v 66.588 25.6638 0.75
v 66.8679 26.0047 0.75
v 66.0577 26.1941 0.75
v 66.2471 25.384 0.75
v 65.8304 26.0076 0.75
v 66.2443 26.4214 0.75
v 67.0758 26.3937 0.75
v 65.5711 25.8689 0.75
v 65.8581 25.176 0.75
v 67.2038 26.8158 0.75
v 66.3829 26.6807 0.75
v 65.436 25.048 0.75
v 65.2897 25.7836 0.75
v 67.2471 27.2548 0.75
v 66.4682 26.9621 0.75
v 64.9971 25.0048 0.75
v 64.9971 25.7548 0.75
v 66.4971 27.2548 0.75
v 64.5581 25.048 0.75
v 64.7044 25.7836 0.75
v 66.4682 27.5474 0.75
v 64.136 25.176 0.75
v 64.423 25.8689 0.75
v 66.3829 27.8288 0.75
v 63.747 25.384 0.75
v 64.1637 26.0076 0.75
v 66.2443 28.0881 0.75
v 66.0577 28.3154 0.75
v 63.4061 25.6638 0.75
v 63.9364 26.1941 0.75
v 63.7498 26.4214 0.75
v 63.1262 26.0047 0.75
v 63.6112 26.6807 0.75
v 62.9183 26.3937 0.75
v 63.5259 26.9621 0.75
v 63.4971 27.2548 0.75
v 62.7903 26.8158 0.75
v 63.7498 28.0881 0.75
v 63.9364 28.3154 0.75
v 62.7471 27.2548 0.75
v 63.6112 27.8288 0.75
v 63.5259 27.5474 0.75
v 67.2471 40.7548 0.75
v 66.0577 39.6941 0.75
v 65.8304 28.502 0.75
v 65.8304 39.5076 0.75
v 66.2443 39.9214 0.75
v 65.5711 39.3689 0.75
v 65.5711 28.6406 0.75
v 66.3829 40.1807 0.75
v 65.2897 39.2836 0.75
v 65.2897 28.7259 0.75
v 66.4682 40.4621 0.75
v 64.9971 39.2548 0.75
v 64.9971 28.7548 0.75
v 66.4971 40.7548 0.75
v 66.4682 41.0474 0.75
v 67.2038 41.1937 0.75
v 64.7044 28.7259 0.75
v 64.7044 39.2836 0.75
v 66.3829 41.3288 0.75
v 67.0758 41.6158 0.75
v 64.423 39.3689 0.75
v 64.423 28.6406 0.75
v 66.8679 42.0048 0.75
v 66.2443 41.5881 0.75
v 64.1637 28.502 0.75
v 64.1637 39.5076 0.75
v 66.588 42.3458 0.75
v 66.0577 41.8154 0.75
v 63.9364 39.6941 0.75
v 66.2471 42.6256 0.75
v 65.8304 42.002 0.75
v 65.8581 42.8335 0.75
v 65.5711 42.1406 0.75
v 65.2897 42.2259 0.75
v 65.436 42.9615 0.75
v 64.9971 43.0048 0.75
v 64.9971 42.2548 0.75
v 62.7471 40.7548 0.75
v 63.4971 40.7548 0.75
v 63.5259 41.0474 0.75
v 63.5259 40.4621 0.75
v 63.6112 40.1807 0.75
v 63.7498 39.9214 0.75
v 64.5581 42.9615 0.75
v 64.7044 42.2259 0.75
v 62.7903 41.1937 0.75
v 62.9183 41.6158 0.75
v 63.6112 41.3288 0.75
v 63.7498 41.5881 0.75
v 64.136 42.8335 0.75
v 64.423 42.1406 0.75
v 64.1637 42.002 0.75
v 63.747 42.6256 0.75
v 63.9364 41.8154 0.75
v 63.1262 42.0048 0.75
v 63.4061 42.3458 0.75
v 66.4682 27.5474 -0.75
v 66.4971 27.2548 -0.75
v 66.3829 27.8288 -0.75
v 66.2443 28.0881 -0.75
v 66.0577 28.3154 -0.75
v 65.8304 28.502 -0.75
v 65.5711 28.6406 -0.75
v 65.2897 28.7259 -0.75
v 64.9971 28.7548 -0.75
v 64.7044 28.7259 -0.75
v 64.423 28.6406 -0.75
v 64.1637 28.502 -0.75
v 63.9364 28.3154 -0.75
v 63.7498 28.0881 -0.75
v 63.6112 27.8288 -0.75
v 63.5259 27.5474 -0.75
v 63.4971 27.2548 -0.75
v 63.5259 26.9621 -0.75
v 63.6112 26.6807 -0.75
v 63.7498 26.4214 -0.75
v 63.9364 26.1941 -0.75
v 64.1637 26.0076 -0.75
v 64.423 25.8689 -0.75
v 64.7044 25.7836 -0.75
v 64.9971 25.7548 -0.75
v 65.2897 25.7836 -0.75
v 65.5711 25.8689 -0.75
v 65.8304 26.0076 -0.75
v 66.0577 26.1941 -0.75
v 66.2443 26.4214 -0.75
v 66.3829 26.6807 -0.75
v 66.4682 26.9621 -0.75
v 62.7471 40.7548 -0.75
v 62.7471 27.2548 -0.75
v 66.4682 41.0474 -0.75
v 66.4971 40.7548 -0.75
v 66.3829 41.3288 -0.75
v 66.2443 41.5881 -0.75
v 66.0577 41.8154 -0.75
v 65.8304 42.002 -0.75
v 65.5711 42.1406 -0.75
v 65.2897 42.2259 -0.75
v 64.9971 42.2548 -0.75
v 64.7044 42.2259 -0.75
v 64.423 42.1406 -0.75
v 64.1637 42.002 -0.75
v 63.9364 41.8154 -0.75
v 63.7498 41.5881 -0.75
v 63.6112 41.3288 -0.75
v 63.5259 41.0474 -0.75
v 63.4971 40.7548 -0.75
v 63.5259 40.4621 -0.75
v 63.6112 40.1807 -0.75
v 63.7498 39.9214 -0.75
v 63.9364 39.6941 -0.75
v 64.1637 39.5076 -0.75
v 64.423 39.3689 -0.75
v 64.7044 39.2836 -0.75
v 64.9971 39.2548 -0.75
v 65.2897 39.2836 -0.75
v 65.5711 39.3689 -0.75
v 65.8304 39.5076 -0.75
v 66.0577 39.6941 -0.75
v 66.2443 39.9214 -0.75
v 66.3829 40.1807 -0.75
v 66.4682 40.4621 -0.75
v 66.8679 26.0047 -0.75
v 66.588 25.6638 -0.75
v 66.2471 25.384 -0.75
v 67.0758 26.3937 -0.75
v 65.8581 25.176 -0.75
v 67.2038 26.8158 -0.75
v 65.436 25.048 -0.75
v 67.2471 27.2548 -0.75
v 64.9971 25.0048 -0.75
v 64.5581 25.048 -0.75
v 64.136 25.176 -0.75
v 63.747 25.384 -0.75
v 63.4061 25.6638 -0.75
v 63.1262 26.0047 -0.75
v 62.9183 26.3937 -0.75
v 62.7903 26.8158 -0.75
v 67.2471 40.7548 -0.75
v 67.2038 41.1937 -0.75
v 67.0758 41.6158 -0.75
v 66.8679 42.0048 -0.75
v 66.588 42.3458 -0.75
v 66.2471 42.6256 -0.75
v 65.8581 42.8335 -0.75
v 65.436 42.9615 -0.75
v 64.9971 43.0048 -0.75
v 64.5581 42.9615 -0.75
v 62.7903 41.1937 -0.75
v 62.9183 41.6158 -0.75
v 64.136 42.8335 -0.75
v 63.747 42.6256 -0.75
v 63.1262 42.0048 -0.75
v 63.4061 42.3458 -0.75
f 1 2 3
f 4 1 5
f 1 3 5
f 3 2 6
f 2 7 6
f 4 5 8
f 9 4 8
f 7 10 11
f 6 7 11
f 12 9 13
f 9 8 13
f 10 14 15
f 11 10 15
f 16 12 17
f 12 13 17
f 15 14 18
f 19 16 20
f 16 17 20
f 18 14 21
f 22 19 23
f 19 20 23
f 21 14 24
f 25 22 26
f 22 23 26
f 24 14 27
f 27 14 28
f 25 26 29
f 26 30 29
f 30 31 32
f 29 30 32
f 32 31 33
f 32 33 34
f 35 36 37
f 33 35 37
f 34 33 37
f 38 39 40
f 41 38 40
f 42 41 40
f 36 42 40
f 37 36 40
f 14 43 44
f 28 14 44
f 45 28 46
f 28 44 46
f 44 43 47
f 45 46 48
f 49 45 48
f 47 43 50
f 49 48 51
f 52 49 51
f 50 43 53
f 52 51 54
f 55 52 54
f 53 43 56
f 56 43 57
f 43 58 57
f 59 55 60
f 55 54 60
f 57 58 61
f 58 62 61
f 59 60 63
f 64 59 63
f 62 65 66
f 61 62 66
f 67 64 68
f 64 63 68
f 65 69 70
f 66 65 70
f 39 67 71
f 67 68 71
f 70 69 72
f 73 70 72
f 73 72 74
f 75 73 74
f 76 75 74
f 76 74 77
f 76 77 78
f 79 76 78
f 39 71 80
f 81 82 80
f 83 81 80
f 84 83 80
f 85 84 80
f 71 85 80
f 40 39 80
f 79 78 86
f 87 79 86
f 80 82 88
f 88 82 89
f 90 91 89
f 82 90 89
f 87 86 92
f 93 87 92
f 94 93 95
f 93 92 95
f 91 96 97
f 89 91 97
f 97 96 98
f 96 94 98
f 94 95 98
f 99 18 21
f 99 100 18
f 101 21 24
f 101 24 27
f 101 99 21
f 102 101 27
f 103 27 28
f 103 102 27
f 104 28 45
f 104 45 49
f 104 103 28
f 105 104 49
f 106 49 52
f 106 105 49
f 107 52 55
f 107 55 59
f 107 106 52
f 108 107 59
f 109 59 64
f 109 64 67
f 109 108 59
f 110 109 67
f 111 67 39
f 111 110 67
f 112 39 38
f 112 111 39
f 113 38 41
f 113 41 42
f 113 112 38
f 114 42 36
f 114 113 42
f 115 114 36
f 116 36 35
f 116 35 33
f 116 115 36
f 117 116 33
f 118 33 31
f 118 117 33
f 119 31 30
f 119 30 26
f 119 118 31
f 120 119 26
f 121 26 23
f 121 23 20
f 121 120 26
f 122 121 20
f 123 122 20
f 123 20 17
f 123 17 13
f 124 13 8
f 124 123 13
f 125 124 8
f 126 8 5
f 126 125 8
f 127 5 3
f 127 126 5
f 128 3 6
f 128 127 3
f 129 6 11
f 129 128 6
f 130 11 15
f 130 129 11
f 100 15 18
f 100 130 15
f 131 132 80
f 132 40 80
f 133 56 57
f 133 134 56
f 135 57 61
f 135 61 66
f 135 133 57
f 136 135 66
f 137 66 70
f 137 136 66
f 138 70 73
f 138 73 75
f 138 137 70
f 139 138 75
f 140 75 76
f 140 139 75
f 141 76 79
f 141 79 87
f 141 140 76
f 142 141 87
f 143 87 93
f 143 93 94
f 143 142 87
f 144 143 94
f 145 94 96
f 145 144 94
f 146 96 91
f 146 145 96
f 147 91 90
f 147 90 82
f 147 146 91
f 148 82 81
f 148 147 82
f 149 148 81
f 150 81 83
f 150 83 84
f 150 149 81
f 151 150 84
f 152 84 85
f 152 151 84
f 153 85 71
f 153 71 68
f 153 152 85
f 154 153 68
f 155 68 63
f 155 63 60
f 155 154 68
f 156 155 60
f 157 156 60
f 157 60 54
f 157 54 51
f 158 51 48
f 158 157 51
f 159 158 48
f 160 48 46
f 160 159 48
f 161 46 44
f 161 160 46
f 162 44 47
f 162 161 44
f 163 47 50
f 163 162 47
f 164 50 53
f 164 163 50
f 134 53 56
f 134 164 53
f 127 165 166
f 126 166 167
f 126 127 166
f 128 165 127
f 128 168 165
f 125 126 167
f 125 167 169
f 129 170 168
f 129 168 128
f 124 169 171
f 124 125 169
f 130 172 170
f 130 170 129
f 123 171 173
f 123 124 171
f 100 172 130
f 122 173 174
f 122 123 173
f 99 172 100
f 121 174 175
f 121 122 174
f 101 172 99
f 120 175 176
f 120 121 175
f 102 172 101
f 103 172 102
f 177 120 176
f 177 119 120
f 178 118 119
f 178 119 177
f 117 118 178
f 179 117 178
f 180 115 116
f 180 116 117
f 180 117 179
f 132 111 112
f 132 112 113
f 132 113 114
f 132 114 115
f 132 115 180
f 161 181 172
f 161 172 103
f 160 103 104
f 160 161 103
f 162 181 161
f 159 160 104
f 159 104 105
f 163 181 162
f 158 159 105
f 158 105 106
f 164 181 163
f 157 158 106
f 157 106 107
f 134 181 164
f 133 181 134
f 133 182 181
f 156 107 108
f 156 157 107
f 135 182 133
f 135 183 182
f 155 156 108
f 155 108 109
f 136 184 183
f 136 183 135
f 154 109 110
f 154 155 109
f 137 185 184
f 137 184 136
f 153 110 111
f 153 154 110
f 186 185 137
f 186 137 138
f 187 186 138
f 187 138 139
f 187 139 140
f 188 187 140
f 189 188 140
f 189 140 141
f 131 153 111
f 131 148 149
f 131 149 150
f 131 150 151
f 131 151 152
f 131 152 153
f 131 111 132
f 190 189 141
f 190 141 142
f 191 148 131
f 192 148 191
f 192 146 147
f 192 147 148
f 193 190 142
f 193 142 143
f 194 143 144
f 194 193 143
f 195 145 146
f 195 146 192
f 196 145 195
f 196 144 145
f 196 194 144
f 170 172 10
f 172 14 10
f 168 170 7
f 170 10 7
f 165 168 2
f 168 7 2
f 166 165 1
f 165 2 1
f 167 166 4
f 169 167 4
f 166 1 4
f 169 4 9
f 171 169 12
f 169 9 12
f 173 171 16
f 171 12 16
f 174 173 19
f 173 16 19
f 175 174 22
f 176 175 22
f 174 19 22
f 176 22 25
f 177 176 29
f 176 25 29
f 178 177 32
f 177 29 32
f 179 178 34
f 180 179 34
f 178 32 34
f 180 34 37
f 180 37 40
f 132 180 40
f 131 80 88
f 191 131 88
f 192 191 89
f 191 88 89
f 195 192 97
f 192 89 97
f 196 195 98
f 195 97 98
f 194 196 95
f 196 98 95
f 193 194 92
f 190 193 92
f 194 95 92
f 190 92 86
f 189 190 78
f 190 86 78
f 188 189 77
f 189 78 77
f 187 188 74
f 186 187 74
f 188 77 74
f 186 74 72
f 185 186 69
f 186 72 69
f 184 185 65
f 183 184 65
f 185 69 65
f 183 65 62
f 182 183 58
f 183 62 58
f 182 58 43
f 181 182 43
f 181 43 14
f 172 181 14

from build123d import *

# Parameters (mm, degrees)
SKETCH1_R           = 5
BOSS_EXTRUDE1_DEPTH = 2.5
SCALE1_SCALE        = 0.3


with BuildPart() as part:
    # Sketch1 → Boss-Extrude1 (new body, symmetric)
    with BuildSketch(Plane.XY):
        with BuildLine():
            Line((72.497051665, 56.504761557), (72.497051665, 11.504761557))
            ThreePointArc((72.497051665, 11.504761557), (64.997051665, 4.004761557), (57.497051665, 11.504761557))
            Line((57.497051665, 11.504761557), (57.497051665, 56.504761557))
            ThreePointArc((57.497051665, 56.504761557), (64.997051665, 64.004761557), (72.497051665, 56.504761557))
        make_face()
        with Locations((64.997051665, 56.504761557)):
            Circle(SKETCH1_R, mode=Mode.SUBTRACT)
        with Locations((64.997051665, 11.504761557)):
            Circle(SKETCH1_R, mode=Mode.SUBTRACT)
    extrude(amount=BOSS_EXTRUDE1_DEPTH, both=True)


with BuildPart() as part_1:
    # Scale1: scaled about (64.997051665, 34.004761557, 0)
    add(part.part.scale(SCALE1_SCALE).moved(Location((45.497936166, 23.80333309, 0))))


solid = part_1.part
